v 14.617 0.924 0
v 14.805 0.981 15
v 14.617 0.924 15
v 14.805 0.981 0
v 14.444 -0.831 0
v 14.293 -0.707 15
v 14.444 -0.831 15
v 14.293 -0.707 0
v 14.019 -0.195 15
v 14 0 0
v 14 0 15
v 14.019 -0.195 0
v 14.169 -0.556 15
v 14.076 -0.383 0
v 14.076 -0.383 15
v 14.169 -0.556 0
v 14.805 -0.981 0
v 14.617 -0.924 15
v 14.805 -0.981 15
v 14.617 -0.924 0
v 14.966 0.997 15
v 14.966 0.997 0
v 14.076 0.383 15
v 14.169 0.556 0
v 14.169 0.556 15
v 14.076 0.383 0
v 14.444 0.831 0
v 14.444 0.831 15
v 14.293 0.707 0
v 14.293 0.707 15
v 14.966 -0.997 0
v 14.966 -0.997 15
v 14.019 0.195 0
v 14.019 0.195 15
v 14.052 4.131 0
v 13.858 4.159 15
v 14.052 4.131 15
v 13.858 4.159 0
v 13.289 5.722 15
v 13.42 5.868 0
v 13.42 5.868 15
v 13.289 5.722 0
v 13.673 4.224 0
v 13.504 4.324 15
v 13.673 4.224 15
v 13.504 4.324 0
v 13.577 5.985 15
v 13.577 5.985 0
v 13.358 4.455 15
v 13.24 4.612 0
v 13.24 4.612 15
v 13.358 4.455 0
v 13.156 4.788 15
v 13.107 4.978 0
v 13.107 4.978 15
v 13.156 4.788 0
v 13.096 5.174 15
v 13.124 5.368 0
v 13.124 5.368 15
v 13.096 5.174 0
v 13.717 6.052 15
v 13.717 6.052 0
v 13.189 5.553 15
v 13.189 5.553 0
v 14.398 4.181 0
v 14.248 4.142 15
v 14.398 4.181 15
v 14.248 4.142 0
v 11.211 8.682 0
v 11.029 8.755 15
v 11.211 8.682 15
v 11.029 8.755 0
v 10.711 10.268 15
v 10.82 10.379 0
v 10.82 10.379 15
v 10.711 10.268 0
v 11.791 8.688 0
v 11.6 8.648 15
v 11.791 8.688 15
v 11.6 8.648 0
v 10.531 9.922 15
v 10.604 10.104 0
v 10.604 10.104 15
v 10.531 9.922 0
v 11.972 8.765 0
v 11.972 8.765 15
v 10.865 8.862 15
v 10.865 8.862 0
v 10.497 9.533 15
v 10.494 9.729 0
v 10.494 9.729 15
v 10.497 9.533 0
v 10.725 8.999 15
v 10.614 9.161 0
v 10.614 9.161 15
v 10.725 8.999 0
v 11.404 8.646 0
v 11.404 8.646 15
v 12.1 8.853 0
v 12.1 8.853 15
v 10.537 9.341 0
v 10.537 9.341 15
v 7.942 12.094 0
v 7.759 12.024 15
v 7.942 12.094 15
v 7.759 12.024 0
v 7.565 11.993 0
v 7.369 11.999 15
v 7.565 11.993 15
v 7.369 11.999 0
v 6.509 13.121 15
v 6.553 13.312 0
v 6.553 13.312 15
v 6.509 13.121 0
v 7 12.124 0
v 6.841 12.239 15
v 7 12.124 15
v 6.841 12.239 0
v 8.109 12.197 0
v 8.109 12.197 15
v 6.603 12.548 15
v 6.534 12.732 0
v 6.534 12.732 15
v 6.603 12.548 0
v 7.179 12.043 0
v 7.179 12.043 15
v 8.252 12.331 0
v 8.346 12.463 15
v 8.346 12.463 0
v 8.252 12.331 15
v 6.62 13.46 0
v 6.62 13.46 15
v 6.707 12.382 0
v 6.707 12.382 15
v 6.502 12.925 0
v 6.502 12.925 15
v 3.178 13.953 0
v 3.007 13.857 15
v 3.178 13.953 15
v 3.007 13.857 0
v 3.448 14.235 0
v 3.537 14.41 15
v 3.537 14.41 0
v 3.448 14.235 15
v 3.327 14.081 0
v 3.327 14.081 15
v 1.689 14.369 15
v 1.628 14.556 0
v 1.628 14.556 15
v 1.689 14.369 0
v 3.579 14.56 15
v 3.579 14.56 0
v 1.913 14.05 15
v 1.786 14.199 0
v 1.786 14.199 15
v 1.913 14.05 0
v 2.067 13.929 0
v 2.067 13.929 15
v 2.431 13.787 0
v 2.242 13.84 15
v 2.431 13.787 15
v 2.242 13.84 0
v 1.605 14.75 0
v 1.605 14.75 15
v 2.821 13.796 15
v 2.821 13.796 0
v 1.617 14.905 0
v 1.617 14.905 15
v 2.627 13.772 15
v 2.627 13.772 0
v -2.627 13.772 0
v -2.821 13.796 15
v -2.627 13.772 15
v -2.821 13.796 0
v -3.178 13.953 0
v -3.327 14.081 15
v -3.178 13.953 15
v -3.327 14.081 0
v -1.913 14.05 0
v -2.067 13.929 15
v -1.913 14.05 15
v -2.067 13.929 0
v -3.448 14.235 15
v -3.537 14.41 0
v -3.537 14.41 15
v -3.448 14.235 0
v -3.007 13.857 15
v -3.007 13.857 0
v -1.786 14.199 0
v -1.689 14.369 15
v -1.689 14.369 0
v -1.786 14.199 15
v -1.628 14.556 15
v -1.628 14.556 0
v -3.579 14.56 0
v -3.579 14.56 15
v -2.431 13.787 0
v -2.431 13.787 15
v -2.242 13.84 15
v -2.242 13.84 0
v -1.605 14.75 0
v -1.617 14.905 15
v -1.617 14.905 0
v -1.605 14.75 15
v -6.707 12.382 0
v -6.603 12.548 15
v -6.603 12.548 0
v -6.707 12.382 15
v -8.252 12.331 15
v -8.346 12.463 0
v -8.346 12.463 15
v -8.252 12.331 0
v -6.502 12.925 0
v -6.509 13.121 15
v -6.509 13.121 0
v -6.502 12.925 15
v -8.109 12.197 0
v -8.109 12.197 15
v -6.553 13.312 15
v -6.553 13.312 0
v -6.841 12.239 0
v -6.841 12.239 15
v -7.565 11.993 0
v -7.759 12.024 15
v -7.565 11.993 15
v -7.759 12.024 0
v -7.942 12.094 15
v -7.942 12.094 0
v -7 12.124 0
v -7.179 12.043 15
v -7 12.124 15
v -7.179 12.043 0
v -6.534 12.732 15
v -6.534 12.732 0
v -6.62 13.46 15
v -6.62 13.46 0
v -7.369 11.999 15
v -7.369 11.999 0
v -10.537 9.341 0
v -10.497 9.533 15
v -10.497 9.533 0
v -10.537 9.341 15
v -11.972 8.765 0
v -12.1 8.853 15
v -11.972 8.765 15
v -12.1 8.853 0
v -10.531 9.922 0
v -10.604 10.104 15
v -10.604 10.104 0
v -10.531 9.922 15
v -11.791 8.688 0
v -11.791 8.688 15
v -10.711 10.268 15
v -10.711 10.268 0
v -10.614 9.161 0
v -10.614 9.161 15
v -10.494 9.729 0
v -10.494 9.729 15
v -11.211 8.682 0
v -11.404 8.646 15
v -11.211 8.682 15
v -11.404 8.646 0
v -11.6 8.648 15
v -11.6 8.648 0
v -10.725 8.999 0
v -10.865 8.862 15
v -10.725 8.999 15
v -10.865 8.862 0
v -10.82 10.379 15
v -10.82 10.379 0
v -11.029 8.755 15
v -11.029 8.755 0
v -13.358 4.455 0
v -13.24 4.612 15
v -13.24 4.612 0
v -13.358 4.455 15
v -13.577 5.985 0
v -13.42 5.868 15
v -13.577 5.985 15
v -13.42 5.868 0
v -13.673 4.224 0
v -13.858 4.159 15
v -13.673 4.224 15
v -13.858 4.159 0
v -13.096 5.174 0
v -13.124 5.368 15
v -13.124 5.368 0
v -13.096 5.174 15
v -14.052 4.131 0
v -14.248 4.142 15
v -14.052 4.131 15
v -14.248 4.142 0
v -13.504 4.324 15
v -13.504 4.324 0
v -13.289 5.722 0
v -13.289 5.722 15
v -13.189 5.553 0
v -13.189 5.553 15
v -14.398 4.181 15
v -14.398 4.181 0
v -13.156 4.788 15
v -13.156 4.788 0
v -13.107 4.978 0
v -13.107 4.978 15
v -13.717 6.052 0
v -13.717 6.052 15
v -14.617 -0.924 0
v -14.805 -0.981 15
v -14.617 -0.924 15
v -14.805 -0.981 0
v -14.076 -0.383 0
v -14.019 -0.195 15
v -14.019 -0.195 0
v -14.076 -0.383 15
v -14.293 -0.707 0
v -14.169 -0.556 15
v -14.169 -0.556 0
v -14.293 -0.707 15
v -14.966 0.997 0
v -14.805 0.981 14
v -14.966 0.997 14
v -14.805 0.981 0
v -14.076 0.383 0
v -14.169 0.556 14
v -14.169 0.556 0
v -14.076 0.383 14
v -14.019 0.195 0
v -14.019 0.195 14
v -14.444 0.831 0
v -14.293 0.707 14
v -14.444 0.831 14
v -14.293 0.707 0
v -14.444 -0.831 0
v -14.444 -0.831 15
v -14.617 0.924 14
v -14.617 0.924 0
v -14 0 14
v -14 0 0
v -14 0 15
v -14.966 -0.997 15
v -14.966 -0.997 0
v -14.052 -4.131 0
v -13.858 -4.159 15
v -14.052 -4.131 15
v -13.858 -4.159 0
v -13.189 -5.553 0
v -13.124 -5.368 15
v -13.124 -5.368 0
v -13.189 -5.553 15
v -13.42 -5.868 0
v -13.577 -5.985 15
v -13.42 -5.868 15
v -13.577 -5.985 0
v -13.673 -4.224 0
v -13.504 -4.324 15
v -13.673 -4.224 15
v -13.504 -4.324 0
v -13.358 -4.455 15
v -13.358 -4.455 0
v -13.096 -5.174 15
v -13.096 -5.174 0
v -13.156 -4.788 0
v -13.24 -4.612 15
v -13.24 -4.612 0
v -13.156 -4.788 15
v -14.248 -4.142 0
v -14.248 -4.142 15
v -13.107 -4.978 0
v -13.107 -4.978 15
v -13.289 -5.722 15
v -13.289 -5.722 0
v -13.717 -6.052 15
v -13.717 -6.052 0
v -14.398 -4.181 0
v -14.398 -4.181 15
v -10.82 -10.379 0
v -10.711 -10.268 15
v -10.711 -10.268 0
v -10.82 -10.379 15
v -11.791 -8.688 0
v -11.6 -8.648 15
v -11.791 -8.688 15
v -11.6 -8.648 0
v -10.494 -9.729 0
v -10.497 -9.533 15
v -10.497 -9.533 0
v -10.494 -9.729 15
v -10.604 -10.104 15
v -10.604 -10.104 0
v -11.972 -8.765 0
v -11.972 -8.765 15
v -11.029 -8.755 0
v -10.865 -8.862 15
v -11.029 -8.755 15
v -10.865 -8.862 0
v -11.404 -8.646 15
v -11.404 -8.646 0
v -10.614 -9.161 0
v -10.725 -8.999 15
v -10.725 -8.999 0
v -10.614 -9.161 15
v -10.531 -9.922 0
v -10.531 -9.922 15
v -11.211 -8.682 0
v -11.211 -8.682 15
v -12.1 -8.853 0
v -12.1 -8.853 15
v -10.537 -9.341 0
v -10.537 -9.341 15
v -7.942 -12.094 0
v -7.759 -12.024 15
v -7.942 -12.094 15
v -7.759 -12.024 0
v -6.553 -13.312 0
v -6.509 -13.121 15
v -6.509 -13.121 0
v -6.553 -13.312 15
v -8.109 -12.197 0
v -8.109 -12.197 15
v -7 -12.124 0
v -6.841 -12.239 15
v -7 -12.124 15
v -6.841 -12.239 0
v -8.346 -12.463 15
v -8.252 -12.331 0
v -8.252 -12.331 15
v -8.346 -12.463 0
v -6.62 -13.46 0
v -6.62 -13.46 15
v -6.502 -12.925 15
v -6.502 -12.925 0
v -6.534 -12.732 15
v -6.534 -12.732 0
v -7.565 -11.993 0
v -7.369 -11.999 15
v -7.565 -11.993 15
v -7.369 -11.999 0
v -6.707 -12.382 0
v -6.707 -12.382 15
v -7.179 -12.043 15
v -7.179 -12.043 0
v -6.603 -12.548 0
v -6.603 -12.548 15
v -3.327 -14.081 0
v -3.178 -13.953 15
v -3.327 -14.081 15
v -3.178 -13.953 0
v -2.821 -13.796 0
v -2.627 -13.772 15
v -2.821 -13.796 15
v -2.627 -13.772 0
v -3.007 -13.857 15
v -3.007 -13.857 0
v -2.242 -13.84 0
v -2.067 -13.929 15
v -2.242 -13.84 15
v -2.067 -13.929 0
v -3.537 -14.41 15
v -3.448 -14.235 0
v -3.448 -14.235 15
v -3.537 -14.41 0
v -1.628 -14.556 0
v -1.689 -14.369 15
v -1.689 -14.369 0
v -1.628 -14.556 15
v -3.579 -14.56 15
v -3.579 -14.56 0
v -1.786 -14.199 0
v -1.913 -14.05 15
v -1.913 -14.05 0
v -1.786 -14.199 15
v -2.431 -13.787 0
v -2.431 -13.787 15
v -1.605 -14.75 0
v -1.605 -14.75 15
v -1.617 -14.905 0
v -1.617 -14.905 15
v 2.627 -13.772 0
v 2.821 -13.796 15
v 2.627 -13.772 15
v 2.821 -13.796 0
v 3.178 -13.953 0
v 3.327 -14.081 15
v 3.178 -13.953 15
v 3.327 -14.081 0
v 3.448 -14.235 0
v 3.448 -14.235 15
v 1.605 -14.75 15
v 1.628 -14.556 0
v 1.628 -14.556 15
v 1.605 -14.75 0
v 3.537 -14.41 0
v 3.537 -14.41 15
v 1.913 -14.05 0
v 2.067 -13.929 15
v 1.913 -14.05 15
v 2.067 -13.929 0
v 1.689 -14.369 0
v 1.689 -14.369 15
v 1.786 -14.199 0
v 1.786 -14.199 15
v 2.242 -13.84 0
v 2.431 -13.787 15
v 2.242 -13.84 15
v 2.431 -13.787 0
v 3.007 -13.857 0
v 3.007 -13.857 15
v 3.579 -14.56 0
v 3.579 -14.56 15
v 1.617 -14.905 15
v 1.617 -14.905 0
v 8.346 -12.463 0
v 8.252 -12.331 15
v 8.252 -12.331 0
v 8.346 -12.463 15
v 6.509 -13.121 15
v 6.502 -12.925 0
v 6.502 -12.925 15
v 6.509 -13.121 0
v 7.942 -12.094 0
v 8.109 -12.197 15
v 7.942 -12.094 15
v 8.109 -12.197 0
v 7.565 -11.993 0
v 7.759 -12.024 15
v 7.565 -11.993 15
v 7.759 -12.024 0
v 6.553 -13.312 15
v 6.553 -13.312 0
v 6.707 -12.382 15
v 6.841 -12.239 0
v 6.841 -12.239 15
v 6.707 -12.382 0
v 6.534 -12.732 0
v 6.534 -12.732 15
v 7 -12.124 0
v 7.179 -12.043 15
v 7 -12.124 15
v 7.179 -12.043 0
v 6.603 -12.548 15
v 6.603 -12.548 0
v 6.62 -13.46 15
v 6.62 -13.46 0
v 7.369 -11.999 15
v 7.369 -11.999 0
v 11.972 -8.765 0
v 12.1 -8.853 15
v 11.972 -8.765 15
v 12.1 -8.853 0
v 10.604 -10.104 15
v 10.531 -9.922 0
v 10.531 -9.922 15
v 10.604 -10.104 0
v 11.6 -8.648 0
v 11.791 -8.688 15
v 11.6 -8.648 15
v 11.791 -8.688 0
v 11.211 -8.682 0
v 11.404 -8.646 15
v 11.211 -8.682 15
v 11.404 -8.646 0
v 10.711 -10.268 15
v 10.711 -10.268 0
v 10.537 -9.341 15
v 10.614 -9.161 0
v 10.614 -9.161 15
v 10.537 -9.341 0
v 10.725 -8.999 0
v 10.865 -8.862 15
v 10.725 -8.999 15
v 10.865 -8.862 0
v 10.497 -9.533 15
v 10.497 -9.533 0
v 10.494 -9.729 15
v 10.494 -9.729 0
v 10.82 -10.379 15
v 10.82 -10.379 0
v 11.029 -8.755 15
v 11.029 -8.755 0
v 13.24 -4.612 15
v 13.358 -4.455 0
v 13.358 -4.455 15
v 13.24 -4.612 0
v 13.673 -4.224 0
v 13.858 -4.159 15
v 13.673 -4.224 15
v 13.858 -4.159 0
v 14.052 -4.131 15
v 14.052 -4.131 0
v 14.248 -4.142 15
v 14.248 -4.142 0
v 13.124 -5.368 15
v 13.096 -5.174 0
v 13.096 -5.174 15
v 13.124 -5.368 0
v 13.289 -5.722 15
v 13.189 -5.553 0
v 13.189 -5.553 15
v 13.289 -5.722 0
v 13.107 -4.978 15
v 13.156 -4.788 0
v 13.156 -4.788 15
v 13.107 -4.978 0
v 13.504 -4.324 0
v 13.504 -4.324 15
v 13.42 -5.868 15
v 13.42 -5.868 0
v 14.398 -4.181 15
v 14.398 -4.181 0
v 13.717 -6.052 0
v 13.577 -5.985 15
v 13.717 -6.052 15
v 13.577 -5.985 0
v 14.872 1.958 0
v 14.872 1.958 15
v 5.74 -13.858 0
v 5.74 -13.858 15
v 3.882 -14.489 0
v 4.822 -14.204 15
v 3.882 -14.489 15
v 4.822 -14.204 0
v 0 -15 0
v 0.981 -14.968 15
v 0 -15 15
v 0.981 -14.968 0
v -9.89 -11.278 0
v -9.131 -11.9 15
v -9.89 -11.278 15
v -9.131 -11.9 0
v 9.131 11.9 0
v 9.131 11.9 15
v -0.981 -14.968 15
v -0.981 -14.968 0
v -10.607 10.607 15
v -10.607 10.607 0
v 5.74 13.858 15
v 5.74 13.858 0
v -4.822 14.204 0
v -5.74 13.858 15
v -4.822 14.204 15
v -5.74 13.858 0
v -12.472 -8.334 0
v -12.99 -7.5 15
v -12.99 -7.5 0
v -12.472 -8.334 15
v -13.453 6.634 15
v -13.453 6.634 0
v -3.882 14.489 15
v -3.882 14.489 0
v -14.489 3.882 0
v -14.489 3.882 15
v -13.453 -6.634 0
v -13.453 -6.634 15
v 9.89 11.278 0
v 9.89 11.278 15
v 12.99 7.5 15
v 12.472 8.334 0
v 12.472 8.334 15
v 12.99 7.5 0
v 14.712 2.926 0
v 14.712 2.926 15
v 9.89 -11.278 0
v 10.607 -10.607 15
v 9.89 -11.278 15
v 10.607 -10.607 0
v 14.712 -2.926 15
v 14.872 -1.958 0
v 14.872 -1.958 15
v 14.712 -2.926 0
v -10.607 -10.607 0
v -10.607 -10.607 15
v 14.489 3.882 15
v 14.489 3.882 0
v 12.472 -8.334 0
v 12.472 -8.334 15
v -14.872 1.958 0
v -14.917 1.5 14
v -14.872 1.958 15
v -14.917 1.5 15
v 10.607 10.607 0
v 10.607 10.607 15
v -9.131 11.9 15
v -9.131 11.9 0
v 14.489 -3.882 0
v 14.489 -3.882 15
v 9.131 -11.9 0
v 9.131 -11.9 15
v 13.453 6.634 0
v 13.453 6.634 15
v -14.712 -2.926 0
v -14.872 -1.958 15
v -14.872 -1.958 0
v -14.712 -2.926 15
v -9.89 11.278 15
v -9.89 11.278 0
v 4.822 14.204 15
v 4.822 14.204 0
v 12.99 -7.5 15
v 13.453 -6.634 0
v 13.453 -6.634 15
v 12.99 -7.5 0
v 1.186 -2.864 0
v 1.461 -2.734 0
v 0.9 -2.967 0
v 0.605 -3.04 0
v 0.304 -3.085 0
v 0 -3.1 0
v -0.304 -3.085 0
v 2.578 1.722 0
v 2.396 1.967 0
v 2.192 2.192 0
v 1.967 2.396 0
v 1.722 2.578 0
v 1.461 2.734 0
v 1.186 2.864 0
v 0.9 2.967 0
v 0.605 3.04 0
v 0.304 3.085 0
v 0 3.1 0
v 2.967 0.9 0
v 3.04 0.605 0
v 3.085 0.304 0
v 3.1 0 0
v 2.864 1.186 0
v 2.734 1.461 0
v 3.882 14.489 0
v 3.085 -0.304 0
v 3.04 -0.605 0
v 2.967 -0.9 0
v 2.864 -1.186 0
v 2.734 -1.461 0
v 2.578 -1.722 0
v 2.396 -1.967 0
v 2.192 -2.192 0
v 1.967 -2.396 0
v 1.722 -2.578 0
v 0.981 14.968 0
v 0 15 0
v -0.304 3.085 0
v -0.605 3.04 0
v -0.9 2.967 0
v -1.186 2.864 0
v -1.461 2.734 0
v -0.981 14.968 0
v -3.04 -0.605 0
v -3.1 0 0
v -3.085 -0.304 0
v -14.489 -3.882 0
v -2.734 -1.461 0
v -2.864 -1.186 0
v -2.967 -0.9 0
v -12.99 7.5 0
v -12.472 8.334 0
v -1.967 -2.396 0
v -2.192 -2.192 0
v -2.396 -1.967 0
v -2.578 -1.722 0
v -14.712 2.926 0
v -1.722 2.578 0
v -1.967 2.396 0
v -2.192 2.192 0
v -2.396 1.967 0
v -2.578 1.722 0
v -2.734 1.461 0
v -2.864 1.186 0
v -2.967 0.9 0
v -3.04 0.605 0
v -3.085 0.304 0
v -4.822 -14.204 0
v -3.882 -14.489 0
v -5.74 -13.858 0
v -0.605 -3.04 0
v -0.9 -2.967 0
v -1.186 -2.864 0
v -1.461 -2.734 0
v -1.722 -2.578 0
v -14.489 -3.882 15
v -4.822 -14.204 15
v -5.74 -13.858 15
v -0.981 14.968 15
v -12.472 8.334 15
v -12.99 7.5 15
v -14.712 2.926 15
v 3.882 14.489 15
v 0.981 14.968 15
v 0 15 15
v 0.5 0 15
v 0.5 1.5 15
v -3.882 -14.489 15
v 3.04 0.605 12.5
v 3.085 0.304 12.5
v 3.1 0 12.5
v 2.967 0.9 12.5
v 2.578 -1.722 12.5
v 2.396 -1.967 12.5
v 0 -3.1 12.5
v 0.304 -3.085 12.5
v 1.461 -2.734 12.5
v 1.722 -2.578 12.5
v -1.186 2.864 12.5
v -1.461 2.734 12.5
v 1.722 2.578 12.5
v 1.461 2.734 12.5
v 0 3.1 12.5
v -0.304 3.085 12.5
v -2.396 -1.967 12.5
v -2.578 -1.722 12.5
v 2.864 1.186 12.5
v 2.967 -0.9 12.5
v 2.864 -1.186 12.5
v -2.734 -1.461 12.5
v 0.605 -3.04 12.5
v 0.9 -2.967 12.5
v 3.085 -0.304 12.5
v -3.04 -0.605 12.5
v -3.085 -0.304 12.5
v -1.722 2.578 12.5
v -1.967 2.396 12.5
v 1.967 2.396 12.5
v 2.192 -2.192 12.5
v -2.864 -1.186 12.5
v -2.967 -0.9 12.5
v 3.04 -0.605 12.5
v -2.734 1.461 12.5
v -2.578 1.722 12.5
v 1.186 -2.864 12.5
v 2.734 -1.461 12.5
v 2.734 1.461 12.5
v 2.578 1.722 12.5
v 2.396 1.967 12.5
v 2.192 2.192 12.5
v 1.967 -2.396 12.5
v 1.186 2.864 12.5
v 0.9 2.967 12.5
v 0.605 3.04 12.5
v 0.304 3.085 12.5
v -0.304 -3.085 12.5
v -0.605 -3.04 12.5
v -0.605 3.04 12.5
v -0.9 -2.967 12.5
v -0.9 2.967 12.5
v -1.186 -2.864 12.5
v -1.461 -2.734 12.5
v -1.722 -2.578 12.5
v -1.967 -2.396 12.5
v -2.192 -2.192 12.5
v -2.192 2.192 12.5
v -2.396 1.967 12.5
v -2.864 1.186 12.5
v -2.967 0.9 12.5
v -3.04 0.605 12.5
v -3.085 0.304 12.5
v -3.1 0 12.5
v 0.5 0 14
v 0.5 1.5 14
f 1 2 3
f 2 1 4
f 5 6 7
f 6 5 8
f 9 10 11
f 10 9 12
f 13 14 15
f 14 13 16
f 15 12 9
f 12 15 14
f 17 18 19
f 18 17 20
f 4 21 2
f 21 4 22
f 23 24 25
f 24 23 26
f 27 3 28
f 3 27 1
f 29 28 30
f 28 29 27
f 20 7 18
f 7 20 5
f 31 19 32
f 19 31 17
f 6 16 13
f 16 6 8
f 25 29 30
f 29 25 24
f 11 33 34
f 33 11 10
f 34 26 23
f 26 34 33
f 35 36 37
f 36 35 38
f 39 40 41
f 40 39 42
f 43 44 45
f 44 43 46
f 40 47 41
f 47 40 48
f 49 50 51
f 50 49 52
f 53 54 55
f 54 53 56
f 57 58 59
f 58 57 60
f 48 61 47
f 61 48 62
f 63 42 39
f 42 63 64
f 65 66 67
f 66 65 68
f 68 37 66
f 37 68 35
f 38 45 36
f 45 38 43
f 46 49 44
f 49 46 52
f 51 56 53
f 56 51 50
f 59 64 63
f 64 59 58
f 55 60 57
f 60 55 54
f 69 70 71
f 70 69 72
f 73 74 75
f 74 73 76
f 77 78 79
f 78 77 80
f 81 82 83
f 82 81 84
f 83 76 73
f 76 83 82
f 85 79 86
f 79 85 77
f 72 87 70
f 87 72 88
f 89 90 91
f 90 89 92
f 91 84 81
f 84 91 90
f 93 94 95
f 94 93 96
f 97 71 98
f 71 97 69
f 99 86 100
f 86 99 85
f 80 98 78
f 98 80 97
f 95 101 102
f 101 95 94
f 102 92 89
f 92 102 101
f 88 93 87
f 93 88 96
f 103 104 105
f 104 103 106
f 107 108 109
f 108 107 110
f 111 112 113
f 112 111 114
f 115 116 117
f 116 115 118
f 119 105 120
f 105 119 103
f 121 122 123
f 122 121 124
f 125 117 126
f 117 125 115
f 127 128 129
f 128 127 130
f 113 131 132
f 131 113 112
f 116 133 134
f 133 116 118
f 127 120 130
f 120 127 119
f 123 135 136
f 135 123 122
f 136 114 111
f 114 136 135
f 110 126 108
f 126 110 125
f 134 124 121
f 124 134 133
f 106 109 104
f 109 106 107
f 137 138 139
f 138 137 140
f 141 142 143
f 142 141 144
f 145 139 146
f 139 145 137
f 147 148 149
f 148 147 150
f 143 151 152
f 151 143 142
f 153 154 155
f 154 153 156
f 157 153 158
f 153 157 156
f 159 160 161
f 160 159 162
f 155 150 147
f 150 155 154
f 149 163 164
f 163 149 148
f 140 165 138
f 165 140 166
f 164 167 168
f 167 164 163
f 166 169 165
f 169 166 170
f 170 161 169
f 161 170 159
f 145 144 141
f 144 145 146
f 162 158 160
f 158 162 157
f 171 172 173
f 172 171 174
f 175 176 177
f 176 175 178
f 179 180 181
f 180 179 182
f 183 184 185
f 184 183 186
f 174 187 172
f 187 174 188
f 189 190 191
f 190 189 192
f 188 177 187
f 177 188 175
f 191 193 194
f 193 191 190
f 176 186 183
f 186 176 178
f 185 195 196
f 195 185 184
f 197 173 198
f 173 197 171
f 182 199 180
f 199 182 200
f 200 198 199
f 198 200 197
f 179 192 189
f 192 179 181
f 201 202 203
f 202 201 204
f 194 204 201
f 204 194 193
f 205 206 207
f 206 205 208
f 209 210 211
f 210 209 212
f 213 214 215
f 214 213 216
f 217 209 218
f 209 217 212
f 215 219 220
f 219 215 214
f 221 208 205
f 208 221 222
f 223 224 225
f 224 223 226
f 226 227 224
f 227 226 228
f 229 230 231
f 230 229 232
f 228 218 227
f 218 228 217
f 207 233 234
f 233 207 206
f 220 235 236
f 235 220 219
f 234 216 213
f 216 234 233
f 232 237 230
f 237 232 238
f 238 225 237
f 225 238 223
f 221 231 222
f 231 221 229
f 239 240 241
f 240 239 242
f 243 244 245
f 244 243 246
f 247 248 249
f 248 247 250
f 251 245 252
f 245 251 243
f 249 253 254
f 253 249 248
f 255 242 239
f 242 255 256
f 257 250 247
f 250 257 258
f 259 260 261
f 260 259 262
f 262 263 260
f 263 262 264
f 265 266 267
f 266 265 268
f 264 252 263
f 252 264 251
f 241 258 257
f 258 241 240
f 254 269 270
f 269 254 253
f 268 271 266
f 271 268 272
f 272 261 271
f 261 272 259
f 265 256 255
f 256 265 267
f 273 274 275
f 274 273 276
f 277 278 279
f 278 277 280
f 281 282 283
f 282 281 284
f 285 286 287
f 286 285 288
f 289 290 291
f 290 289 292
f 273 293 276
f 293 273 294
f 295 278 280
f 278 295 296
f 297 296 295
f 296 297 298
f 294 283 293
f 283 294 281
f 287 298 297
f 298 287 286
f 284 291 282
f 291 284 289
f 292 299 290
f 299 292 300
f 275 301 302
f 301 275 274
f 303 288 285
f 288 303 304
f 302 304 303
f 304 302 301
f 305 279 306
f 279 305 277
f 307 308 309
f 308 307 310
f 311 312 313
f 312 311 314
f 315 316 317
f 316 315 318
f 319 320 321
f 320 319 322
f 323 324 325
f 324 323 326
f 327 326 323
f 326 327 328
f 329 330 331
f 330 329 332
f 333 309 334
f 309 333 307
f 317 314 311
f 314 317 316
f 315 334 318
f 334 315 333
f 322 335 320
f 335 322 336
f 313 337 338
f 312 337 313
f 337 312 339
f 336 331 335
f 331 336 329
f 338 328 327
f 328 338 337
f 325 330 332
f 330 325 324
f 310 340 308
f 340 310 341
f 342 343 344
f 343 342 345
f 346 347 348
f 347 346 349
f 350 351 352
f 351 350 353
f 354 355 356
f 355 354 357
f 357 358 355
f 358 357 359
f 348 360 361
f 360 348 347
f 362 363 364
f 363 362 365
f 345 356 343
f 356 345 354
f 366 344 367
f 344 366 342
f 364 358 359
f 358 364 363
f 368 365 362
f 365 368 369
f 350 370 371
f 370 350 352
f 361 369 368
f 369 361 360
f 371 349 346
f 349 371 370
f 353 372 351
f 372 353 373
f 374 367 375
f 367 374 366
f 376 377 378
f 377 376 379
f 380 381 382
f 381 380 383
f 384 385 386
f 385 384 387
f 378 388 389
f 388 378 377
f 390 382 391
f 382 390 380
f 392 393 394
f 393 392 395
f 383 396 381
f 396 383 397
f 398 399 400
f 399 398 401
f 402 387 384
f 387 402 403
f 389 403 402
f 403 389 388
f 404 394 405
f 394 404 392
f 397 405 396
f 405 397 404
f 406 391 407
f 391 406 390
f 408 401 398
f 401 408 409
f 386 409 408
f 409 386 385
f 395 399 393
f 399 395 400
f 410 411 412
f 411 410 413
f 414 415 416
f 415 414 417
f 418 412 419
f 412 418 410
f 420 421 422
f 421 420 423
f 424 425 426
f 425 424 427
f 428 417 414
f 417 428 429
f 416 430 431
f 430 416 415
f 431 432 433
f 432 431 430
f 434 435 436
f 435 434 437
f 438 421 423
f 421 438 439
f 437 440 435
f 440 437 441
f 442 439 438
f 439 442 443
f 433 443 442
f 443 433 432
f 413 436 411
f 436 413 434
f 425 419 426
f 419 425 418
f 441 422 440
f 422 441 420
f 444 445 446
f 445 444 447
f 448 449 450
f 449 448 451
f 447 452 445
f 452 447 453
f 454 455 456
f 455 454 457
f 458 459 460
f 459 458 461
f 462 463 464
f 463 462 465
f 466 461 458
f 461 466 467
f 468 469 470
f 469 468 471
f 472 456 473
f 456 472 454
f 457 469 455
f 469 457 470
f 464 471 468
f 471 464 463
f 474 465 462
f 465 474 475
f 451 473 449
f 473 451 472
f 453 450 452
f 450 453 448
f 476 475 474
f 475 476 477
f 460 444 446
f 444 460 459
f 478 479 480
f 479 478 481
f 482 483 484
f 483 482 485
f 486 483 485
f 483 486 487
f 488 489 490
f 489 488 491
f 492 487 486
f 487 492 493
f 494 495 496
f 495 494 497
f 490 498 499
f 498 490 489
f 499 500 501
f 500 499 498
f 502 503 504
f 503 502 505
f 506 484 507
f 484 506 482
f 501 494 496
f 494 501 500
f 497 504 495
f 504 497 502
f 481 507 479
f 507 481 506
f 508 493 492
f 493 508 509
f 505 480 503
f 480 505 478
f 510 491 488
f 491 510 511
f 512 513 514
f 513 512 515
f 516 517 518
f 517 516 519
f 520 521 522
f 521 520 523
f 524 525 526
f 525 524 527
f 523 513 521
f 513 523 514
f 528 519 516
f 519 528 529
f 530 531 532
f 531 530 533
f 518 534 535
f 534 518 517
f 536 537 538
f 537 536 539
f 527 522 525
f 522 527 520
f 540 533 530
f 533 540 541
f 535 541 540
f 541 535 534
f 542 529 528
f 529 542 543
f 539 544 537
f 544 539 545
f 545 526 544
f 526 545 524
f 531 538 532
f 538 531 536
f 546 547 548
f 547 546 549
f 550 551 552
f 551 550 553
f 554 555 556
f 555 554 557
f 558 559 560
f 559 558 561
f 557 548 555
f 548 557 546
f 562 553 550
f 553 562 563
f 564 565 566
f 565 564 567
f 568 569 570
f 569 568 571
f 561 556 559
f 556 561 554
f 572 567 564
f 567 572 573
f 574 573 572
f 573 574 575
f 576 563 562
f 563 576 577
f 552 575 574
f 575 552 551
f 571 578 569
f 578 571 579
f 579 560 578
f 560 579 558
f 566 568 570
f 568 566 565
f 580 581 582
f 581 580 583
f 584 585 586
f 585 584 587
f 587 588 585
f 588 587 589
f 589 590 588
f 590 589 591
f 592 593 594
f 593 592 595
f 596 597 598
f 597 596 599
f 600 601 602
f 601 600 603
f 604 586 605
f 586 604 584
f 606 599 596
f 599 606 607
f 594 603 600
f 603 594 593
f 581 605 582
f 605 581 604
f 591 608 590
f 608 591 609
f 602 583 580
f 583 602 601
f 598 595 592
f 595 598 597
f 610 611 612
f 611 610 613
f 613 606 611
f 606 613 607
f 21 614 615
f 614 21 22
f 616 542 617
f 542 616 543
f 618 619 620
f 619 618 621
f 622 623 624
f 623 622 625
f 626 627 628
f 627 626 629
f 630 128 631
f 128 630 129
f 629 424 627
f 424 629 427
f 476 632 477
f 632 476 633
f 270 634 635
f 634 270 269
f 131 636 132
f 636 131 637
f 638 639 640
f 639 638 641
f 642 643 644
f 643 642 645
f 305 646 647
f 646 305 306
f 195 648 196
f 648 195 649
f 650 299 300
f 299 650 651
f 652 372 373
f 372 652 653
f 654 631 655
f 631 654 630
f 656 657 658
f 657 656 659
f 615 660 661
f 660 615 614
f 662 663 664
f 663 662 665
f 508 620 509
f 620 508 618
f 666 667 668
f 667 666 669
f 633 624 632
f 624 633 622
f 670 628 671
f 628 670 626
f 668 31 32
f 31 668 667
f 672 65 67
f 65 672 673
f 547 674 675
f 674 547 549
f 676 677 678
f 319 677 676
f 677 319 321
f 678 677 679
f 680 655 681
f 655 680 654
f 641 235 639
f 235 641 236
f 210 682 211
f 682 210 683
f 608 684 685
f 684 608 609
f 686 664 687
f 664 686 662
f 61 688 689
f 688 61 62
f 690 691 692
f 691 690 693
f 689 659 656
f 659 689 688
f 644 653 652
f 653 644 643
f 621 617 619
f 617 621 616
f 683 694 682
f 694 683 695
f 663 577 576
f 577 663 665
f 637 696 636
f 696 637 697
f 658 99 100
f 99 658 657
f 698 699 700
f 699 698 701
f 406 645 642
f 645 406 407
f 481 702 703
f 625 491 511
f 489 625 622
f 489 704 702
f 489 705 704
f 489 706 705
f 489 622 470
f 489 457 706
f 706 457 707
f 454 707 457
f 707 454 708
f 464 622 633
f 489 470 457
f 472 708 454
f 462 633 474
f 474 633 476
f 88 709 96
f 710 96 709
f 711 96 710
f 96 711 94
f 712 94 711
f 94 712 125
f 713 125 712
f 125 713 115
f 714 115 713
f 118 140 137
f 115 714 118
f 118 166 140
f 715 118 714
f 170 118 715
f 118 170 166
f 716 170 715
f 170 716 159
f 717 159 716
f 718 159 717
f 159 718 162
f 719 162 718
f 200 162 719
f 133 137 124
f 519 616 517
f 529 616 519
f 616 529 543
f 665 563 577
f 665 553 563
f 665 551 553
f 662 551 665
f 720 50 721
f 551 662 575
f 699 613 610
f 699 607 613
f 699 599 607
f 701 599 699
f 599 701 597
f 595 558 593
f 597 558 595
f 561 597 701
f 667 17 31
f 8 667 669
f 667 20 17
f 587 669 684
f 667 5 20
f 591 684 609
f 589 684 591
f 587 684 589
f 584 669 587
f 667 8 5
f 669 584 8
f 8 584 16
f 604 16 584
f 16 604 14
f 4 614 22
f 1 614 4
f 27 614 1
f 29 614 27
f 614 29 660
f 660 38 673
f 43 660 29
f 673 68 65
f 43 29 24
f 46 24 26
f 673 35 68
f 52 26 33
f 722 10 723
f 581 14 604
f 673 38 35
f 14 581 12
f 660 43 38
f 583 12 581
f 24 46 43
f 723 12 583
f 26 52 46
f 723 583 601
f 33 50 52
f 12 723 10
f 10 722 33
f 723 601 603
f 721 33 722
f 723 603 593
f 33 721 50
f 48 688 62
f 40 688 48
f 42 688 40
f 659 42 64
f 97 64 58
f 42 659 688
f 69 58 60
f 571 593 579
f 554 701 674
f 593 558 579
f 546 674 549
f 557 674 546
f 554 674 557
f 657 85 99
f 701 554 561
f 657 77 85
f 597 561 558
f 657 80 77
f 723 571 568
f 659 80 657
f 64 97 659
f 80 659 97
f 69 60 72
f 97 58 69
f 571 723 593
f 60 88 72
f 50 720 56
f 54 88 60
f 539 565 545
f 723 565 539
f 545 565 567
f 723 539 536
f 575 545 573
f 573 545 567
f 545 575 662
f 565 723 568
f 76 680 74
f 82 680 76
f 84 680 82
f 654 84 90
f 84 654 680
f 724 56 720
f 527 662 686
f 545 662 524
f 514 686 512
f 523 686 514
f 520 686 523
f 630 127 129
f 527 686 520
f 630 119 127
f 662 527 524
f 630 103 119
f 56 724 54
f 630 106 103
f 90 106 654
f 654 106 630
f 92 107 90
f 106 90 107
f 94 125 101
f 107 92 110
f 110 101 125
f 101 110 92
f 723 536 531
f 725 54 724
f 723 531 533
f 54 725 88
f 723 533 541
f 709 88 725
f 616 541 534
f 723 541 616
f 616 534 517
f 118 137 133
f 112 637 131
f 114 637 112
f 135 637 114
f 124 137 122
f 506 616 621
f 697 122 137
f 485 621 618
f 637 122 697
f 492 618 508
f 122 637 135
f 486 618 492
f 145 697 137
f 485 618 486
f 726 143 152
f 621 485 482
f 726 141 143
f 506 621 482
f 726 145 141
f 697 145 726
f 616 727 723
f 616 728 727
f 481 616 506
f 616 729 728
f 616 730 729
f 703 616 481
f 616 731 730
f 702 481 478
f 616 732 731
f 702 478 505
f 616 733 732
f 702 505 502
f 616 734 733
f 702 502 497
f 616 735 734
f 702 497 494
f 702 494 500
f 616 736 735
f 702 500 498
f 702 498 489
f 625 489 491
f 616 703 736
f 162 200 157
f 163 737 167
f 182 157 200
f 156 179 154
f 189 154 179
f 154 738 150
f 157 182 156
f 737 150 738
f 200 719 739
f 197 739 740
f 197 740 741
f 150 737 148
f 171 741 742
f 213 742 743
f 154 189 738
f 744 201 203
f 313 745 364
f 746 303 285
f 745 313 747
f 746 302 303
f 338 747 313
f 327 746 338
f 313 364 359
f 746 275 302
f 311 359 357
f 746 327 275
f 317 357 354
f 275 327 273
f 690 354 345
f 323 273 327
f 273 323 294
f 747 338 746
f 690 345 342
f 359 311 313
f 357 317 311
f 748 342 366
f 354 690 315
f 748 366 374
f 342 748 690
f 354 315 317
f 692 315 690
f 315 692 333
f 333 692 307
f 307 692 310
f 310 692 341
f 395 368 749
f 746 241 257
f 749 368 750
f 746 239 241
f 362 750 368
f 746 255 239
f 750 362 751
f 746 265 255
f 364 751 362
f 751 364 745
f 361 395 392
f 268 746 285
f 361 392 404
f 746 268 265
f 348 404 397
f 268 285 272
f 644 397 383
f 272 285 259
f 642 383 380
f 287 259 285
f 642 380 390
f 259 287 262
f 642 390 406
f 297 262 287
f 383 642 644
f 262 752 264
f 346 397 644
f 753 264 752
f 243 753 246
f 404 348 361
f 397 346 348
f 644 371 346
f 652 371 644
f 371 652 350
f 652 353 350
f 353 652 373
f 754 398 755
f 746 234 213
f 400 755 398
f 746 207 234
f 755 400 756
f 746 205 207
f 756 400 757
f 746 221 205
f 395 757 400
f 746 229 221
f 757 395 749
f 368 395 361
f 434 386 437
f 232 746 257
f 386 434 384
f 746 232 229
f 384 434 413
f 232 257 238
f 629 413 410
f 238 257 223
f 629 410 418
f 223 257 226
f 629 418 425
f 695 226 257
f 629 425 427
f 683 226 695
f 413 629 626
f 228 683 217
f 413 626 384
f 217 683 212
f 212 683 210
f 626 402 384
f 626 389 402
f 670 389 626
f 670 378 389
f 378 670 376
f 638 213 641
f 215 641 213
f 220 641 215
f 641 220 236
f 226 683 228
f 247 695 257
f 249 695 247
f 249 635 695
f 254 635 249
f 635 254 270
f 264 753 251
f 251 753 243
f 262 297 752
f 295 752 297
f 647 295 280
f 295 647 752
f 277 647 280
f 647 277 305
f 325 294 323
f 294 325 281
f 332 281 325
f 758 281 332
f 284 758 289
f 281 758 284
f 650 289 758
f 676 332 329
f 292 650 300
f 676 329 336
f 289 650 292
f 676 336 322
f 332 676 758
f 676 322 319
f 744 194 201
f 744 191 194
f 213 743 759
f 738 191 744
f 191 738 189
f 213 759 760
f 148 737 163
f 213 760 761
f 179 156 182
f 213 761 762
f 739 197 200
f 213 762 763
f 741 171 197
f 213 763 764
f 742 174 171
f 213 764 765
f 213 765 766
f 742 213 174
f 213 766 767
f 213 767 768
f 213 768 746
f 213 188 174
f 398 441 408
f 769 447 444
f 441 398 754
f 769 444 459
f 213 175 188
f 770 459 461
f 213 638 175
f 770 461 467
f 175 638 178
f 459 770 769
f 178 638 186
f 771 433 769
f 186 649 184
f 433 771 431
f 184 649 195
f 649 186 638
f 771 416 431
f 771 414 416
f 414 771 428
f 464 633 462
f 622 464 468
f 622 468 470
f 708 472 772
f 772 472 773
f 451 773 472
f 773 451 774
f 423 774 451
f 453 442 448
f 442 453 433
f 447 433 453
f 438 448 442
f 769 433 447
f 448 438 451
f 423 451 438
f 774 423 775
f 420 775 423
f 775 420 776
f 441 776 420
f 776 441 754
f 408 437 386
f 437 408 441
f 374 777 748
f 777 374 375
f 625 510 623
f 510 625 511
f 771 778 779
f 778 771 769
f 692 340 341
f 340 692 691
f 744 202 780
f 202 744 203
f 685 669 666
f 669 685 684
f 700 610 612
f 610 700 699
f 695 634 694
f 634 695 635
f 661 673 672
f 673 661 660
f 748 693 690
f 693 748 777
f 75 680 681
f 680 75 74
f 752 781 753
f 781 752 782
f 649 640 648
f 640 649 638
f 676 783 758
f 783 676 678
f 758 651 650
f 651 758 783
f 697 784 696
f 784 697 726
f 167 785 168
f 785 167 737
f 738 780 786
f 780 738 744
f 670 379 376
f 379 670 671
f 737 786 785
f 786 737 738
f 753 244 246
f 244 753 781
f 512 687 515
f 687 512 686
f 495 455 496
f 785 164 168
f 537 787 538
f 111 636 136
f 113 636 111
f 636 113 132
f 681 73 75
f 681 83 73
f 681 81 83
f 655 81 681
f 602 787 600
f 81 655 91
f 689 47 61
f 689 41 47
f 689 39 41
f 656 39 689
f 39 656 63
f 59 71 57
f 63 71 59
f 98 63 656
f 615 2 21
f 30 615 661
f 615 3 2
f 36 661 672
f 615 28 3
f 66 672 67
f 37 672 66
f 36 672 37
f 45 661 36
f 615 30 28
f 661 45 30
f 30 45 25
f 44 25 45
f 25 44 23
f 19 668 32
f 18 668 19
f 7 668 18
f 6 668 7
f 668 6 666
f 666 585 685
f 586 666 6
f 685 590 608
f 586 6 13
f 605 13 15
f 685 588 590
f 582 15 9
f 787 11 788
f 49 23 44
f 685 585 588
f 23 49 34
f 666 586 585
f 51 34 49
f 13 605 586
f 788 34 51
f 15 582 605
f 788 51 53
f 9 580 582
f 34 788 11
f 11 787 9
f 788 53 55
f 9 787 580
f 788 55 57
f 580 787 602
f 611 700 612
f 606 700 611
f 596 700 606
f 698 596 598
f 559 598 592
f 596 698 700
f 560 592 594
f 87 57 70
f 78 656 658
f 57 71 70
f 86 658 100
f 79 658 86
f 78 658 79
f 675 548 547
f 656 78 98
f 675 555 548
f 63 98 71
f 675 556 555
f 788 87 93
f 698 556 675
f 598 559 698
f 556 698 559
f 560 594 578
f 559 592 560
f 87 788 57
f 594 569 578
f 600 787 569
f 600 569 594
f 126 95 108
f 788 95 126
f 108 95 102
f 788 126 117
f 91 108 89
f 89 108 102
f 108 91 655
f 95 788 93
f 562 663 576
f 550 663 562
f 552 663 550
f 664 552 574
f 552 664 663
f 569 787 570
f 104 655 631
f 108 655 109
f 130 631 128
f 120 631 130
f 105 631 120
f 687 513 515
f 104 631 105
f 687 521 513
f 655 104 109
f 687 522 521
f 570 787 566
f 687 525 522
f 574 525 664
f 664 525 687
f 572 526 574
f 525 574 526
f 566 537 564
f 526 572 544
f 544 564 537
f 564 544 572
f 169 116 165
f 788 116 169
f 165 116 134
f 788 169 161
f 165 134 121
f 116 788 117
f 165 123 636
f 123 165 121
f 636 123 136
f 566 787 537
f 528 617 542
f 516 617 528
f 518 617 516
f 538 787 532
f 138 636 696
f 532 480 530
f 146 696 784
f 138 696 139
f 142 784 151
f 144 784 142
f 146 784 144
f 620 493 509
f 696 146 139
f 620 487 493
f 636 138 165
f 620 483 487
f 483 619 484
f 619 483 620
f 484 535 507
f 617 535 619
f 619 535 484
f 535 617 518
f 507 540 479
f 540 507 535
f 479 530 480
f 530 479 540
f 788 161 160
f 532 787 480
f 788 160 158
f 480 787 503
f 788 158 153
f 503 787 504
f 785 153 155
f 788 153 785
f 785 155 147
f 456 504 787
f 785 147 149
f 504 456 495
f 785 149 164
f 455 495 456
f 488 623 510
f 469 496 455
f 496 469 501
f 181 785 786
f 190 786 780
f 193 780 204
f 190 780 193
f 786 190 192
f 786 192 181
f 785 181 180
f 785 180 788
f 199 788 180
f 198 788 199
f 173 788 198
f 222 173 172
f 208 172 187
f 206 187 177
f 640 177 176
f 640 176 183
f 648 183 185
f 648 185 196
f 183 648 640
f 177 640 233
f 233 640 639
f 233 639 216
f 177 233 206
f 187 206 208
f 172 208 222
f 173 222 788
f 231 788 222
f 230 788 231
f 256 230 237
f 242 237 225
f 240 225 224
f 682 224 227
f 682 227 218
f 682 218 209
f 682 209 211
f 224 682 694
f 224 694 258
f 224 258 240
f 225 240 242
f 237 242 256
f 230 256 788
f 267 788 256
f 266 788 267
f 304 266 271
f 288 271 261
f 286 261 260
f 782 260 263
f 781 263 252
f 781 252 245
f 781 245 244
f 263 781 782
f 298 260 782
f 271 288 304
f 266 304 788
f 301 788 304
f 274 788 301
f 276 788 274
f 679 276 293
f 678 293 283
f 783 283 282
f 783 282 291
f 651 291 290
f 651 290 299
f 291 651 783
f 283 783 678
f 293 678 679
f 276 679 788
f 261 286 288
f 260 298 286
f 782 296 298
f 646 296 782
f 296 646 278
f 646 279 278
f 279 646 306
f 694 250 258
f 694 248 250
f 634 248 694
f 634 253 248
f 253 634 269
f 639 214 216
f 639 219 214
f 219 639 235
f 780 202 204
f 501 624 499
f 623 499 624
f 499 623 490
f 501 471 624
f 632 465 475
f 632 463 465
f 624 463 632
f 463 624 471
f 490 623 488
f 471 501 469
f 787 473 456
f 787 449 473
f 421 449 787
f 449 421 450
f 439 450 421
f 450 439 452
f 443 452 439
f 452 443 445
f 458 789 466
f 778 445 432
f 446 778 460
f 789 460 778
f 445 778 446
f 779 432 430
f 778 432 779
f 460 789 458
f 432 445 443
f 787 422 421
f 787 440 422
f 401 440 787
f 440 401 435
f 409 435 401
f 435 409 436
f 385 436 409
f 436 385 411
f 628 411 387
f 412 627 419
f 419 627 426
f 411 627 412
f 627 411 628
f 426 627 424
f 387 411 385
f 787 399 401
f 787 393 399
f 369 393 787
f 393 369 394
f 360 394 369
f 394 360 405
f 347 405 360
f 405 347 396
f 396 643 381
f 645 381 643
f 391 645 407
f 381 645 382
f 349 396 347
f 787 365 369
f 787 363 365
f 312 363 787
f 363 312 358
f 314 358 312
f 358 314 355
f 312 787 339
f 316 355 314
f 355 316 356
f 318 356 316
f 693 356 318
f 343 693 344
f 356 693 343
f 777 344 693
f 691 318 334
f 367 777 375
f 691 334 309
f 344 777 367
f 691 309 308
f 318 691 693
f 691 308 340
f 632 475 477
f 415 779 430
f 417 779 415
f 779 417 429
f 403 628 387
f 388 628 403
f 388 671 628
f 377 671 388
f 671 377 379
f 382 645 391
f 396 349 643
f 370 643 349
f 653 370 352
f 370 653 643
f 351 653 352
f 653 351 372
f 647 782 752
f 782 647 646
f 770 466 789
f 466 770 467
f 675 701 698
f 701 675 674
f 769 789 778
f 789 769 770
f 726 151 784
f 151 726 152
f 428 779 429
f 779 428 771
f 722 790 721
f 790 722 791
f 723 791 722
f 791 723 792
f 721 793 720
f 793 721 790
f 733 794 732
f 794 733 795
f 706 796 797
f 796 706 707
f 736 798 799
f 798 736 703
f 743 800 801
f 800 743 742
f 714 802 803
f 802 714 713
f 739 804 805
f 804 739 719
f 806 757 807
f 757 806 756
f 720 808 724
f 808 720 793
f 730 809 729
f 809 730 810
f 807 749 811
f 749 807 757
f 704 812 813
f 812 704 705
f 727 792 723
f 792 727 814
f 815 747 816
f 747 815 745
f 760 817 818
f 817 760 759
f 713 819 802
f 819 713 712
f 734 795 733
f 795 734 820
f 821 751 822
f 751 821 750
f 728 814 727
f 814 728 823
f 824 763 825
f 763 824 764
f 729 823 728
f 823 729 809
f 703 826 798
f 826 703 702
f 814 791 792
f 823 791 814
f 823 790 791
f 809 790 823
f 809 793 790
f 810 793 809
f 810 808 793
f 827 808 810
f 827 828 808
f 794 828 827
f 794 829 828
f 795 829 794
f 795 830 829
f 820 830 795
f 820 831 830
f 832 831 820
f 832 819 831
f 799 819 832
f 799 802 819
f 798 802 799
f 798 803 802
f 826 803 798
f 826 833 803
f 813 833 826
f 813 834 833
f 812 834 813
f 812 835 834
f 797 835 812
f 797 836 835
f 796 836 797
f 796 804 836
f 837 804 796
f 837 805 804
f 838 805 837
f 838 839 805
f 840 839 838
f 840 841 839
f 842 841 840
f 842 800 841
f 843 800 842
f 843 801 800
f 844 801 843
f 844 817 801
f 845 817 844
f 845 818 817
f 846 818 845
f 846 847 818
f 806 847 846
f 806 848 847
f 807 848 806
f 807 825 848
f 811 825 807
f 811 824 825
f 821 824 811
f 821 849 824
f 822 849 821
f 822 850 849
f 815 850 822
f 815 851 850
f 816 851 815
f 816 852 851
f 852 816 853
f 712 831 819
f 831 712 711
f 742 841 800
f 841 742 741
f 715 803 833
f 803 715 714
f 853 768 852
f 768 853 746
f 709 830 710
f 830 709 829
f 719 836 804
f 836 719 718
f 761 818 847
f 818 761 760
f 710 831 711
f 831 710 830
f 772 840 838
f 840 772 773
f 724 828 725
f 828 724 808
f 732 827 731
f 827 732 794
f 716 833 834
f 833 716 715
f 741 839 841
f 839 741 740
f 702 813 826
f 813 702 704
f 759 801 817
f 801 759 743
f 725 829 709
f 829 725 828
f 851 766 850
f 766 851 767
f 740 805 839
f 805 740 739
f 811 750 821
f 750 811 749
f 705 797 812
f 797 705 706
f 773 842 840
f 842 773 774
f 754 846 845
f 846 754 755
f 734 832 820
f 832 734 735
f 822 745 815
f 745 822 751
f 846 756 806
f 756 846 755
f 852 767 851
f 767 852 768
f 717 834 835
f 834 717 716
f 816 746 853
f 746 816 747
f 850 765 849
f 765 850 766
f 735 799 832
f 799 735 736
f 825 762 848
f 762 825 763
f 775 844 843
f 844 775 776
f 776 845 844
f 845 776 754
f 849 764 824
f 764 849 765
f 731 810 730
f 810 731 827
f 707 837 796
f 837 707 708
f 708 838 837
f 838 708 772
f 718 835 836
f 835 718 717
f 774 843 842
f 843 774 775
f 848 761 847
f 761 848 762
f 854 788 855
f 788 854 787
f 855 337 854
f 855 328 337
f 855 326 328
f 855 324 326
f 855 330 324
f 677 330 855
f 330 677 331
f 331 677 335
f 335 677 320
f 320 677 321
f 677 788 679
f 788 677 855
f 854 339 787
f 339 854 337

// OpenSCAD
// Replacement knob for hotplate stirrer with D-shaft (6 mm)
// Print orientation: side facing hotplate down on bed (z = 0)

// ---------------- Parameters ----------------
knob_d          = 30;    // knob outer diameter
knob_h          = 15;    // knob height
bore_depth      = 12;    // D-shaped blind bore depth from bottom
shaft_d         = 6.2;   // D-shaft diameter
bore_flat       = 4.7;   // distance from D-bore flat to opposite side
groove_count    = 18;    // number of vertical grip grooves
groove_d        = 2;     // grip groove diameter (half-cylinder)
pointer_w       = 1.5;   // pointer groove width
pointer_d       = 1;     // pointer groove depth
eps             = 0.5;   // cutter overshoot past faces

$fn = 96;

// ---------------- Model ----------------
difference() {
    // Main knob body
    cylinder(d = knob_d, h = knob_h);

    // D-shaped blind bore from bottom face
    translate([0, 0, -eps])
        cylinder(d = shaft_d, h = bore_depth + 2 * eps, $fn = 64);

    // Outer grip grooves, full height, centred on surface
    for (i = [0 : groove_count - 1])
        rotate([0, 0, i * 360 / groove_count])
            translate([knob_d / 2, 0, -eps])
                cylinder(d = groove_d, h = knob_h + 2 * eps, $fn = 32);

    // Pointer groove on top face, same side as D-bore flat
    // (placed on -X so it shares the flat side with the bore)
    translate([-knob_d / 2, 0, knob_h - pointer_d])
        cube([knob_d / 2 + eps, pointer_w, pointer_d + eps]);
}
